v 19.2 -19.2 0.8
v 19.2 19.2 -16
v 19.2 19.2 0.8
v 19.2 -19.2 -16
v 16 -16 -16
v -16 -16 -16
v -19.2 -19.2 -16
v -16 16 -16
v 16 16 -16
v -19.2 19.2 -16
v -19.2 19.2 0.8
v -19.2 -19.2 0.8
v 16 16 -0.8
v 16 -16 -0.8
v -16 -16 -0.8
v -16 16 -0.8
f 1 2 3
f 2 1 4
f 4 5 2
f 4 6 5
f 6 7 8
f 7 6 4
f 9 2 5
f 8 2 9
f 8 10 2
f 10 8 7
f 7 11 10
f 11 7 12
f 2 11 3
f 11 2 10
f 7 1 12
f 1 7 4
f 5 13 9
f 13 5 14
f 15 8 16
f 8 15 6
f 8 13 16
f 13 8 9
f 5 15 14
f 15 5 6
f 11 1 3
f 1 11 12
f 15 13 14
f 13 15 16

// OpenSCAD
size = 32;//block=32 //item=8



//cube([size*0.8,size*0.8,size*0.8],center=true);
cube([size * 1.2, size * 1.2, size * 0.05], center = true);
translate([0, 0, -size * 0.25]) {
  difference() {
    cube([size * 1.2, size * 1.2, size * 0.5], center = true);
    union() {
      translate([0, 0, -size * 0.01]) {
        cube([size * 1.0, size * 1.0, size * 0.5], center = true);
      }
      ;//translate
    }
    ;//union

  }
  ;//difference
}
;//translate
